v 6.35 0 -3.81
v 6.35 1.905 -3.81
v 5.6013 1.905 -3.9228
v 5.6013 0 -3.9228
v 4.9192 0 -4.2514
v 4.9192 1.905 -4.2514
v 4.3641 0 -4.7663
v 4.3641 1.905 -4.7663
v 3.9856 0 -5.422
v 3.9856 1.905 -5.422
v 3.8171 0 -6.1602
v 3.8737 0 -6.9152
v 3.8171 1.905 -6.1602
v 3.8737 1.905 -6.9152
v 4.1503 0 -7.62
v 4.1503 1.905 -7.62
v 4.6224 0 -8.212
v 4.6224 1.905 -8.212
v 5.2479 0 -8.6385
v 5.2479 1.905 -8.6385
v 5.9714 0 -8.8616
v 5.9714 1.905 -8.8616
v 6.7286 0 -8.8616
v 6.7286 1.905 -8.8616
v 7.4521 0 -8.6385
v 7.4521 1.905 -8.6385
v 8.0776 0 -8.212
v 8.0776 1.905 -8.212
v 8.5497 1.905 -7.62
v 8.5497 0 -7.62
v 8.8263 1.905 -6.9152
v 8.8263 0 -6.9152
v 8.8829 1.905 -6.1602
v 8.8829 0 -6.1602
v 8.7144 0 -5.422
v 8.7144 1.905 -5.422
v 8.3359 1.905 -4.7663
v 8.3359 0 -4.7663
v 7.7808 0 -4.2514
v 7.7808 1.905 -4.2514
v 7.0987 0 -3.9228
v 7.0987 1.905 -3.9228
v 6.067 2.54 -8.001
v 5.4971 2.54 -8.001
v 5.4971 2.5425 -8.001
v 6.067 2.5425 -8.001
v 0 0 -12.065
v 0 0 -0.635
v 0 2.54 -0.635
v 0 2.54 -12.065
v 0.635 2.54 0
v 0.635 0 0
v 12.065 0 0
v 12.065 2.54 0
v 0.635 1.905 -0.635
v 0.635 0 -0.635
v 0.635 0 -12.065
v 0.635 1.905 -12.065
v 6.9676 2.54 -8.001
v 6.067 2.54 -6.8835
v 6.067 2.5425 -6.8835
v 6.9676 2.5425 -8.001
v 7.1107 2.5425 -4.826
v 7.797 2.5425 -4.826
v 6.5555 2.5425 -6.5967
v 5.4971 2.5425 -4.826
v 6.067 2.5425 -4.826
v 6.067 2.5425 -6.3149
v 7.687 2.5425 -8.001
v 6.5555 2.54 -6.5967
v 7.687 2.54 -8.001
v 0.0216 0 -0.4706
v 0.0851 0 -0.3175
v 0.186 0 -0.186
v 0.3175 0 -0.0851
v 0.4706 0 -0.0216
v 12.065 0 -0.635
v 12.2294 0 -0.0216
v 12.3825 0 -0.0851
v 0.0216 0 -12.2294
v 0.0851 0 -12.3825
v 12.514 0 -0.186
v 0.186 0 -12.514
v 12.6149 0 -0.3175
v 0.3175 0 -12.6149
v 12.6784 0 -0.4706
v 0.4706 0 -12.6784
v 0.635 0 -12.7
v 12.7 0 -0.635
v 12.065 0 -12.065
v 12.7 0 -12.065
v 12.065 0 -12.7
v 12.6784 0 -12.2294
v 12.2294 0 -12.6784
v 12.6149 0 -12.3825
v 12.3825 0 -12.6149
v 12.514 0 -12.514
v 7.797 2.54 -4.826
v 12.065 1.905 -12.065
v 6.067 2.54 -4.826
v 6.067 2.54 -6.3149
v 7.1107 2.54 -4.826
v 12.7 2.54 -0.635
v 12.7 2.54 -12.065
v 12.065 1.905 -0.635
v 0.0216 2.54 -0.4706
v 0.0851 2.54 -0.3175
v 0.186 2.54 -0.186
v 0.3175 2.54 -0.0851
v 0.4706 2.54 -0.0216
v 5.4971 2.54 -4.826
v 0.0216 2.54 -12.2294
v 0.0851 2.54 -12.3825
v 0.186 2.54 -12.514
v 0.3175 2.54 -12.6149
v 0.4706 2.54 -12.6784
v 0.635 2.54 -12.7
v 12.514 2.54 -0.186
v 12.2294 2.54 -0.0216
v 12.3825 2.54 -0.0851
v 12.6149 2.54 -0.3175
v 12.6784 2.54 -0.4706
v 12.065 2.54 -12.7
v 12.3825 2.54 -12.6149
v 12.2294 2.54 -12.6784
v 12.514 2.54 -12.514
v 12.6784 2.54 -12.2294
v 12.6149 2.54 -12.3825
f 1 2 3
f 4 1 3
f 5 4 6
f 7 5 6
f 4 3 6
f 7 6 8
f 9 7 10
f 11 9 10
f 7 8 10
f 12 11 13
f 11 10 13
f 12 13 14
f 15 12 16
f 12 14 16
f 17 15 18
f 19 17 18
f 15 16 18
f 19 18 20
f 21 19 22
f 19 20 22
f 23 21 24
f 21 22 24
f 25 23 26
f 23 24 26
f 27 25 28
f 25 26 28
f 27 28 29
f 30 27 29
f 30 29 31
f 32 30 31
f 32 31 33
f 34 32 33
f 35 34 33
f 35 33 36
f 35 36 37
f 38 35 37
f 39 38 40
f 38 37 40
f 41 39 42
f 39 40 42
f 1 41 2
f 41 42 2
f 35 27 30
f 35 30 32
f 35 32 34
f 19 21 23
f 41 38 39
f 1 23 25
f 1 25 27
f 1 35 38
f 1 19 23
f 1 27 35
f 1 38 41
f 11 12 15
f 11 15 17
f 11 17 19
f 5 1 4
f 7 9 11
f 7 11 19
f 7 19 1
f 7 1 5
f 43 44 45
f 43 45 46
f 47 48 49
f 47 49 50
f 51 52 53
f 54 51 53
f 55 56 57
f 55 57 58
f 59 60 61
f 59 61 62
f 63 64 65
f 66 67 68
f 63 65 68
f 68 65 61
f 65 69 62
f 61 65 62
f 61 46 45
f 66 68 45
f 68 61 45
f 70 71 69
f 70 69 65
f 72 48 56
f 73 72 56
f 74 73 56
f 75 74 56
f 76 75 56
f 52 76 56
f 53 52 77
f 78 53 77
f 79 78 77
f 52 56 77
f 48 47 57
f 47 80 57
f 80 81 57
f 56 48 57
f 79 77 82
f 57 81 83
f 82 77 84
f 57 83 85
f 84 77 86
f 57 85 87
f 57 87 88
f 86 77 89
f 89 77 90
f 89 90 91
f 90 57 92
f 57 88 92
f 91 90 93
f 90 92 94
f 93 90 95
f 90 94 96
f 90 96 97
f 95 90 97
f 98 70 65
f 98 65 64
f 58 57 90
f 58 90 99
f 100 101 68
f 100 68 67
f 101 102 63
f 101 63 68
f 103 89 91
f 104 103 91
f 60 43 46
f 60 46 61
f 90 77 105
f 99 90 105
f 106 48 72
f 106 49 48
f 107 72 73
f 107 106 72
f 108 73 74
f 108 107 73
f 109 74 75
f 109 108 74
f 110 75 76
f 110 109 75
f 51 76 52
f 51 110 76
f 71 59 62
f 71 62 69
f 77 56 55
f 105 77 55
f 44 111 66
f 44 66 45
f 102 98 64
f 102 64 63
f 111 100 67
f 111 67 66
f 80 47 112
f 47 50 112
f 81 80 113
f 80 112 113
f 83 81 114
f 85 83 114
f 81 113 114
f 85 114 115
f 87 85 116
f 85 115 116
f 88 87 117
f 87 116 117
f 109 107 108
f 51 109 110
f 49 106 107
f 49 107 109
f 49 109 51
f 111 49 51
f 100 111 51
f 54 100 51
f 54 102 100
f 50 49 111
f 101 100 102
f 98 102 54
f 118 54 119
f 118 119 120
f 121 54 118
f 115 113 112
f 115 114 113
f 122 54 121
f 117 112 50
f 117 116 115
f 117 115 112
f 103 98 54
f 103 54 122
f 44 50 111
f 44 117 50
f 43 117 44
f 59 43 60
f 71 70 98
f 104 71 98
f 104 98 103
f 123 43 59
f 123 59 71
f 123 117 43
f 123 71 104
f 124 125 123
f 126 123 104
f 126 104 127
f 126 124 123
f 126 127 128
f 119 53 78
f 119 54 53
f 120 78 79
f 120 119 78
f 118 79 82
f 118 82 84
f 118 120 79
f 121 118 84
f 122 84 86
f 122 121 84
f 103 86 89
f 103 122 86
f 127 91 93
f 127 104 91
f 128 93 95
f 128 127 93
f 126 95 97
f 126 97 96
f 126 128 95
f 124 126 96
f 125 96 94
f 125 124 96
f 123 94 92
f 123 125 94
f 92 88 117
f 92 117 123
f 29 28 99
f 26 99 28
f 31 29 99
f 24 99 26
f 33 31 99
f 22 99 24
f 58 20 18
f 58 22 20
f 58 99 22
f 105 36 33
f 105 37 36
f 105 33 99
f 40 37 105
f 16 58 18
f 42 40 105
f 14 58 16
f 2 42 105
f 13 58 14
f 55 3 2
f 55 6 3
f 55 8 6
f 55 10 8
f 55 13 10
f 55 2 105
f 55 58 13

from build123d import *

# Parameters (mm, degrees)
SKETCH1_W           = 12.7
SKETCH1_H           = 12.7
BOSS_EXTRUDE1_DEPTH = 2.54
FILLET1_R           = 0.635
SHELL1_START        = 0.635
SHELL1_OUTLINE_W    = 1.905
SHELL1_OUTLINE_H    = 11.43
SHELL1_DEPTH        = 11.43
SKETCH2_R           = 2.54
BOSS_EXTRUDE2_DEPTH = 1.905
BOSS_EXTRUDE3_DEPTH = 0.00254


# Read off the part's stored shape, not the designer's step: Shell1
with BuildPart() as part:
    # Sketch1 → Boss-Extrude1 (new body)
    with BuildSketch(Plane(origin=(0, 0, 0), x_dir=(1, 0, 0), z_dir=(0, 1, 0))):
        with Locations((6.35, 6.35)):
            Rectangle(SKETCH1_W, SKETCH1_H)
    extrude(amount=BOSS_EXTRUDE1_DEPTH)

    # Fillet1
    fillet1_edges = [part.edges().sort_by_distance(p)[0] for p in [
        (0, 1.27, -12.7),
        (12.7, 1.27, -12.7),
        (12.7, 1.27, 0),
        (0, 1.27, 0),
    ]]
    fillet(fillet1_edges, radius=FILLET1_R)

    # Shell1 outline → Shell1 (cut)
    with BuildSketch(Plane.YZ.offset(SHELL1_START)):
        with Locations((0.9525, -6.35)):
            Rectangle(SHELL1_OUTLINE_W, SHELL1_OUTLINE_H)
    extrude(amount=SHELL1_DEPTH, mode=Mode.SUBTRACT)

    # Sketch2 → Boss-Extrude2 (add)
    with BuildSketch(Plane(origin=(0, 1.905, 0), x_dir=(-1, 0, 0), z_dir=(0, -1, 0))):
        with Locations(Location((-6.35, 6.35, 0), (0, 0, 270))):
            Circle(SKETCH2_R)
    extrude(amount=BOSS_EXTRUDE2_DEPTH)

    # Sketch3 → Boss-Extrude3 (add)
    with BuildSketch(Plane(origin=(0, 2.54, 0), x_dir=(1, 0, 0), z_dir=(0, 1, 0))):
        Polygon((5.497146154, 8.001), (6.067017949, 8.001), (6.067017949, 6.883517027), (6.96761891, 8.001), (7.686954848, 8.001), (6.555479487, 6.596673077), (7.796985897, 4.826), (7.110722877, 4.826), (6.067017949, 6.314917268), (6.067017949, 4.826), (5.497146154, 4.826), align=None)
    extrude(amount=BOSS_EXTRUDE3_DEPTH)


solid = part.part
